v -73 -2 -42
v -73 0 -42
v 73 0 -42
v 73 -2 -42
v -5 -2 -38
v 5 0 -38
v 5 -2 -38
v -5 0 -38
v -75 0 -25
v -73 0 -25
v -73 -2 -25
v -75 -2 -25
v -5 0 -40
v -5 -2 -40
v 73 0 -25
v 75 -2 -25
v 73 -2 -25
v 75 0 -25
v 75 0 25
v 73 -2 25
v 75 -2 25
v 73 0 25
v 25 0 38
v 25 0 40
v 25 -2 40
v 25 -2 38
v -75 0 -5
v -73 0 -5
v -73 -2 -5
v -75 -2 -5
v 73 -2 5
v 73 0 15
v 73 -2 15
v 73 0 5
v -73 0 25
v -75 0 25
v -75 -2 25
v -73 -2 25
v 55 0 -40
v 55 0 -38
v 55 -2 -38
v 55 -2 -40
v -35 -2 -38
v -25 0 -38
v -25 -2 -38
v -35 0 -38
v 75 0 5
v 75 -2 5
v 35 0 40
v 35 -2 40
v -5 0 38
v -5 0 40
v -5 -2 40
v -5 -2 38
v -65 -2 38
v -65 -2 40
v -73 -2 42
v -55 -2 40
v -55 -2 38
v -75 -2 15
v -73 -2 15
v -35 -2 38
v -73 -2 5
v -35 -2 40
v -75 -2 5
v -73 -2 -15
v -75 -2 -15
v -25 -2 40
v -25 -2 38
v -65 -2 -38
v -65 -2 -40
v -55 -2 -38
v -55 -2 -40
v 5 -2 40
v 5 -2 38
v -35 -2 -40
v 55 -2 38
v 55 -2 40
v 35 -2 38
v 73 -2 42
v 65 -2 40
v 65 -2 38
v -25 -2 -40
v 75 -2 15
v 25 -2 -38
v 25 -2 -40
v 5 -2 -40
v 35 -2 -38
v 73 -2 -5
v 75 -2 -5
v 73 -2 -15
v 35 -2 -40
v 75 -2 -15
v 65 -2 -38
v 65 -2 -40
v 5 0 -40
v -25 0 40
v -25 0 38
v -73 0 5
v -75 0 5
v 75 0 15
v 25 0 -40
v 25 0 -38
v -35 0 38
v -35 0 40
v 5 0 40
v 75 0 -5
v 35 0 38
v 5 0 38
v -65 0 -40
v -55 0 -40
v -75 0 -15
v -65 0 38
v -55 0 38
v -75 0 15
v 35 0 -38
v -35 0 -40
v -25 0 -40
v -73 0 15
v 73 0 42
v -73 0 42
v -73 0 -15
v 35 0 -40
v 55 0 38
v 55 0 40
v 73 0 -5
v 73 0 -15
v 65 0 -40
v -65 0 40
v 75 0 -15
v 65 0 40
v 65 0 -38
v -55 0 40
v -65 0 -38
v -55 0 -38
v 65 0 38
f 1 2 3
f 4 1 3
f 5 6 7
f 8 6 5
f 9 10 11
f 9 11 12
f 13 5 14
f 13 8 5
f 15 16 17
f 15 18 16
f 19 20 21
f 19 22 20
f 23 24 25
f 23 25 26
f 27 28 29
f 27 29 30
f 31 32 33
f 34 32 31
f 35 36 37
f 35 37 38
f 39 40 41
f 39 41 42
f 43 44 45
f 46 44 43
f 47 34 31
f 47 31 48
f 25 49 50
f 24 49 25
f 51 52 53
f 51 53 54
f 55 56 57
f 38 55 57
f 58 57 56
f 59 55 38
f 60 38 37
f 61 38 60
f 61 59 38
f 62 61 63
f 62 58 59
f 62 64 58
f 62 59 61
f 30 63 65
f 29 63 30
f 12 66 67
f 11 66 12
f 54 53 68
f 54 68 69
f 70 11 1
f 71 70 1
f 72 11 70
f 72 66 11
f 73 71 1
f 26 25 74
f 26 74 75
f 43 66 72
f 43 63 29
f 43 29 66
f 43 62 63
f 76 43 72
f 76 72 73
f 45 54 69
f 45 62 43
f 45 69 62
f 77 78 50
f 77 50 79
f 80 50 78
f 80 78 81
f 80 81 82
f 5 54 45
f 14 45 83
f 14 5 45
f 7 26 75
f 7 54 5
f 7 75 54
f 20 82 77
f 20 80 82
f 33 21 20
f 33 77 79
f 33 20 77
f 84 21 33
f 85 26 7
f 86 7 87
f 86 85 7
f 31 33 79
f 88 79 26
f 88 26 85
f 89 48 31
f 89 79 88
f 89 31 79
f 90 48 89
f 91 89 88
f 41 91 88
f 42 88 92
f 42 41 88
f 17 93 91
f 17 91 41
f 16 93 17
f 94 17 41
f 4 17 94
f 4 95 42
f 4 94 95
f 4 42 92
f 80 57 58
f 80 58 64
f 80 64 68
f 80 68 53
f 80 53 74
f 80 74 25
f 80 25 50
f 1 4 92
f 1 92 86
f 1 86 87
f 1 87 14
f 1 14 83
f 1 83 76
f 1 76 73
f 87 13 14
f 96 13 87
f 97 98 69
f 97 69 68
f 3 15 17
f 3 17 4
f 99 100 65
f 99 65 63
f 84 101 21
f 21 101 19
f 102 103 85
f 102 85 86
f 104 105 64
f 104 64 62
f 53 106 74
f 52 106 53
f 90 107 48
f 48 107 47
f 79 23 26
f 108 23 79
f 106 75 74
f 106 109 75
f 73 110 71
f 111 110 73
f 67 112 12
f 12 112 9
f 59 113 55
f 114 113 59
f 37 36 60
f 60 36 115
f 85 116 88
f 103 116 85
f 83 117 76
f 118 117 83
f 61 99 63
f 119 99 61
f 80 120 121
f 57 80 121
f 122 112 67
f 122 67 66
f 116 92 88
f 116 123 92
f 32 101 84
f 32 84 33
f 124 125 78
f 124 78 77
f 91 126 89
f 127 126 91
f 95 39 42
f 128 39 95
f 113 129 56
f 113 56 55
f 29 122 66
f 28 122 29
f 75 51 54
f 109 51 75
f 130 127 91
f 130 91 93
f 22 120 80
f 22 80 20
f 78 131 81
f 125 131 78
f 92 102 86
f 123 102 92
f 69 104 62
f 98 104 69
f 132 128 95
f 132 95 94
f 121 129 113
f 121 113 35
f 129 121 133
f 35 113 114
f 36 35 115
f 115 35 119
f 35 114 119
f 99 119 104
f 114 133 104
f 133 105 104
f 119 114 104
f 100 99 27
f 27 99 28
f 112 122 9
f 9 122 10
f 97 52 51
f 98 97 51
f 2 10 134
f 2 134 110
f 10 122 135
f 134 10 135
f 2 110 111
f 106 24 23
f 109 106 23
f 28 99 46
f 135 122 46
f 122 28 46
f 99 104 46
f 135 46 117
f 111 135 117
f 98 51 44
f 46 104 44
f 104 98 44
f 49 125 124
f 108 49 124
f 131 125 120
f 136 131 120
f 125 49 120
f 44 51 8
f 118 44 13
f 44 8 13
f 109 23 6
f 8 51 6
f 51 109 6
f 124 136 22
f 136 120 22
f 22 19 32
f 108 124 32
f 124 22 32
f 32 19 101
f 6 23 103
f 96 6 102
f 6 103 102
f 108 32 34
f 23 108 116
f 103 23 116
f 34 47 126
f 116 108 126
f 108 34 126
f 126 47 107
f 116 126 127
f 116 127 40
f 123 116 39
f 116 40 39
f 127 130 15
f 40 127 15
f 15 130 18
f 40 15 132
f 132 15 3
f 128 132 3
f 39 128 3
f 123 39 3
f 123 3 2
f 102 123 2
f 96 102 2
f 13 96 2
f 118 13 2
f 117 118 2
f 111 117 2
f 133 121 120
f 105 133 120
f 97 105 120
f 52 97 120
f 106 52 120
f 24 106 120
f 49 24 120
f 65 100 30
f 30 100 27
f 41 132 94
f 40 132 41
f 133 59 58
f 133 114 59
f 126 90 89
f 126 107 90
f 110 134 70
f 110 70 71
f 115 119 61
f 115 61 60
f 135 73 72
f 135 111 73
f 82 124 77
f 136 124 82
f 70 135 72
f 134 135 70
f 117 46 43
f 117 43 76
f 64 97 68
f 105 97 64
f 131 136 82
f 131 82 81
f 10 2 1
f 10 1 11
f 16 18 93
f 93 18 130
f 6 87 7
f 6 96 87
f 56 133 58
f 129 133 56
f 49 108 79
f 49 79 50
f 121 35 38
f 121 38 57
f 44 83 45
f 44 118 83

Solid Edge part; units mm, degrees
sketch "Sketch1" plane through (0, 0, 0) normal (0, -1, 0) x (1, 0, 0)
  line L0 (75, -42) -> (75, 42)
  line L1 (75, 42) -> (-75, 42)
  line L2 (-75, 42) -> (-75, -42)
  line L3 (-75, -42) -> (75, -42)
extrude "Protrusion1" add sketch "Sketch1" along normal blind 2
sketch "Sketch2" plane through (0, 0, 0) normal (0, -1, 0) x (1, 0, 0)
  line L0 (-55, 38) -> (-55, 40)
  line L1 (-55, 40) -> (-65, 40)
  line L2 (-65, 40) -> (-65, 38)
  line L3 (-65, 38) -> (-55, 38)
  line L4 (-25, 40) -> (-35, 40)
  line L5 (-35, 40) -> (-35, 38)
  line L6 (-35, 38) -> (-25, 38)
  line L7 (-25, 38) -> (-25, 40)
  line L8 (-5, 38) -> (5, 38)
  line L9 (5, 38) -> (5, 40)
  line L10 (5, 40) -> (-5, 40)
  line L11 (-5, 40) -> (-5, 38)
  line L12 (25, 38) -> (35, 38)
  line L13 (35, 38) -> (35, 40)
  line L14 (35, 40) -> (25, 40)
  line L15 (25, 40) -> (25, 38)
  line L16 (55, 38) -> (65, 38)
  line L17 (65, 38) -> (65, 40)
  line L18 (65, 40) -> (55, 40)
  line L19 (55, 40) -> (55, 38)
  line L20 (65, -40) -> (65, -38)
  line L21 (65, -38) -> (55, -38)
  line L22 (55, -38) -> (55, -40)
  line L23 (55, -40) -> (65, -40)
  line L24 (25, -40) -> (35, -40)
  line L25 (35, -40) -> (35, -38)
  line L26 (35, -38) -> (25, -38)
  line L27 (25, -38) -> (25, -40)
  line L28 (5, -38) -> (-5, -38)
  line L29 (-5, -38) -> (-5, -40)
  line L30 (-5, -40) -> (5, -40)
  line L31 (5, -40) -> (5, -38)
  line L32 (-25, -38) -> (-35, -38)
  line L33 (-35, -38) -> (-35, -40)
  line L34 (-35, -40) -> (-25, -40)
  line L35 (-25, -40) -> (-25, -38)
  line L36 (-55, -40) -> (-55, -38)
  line L37 (-55, -38) -> (-65, -38)
  line L38 (-65, -38) -> (-65, -40)
  line L39 (-65, -40) -> (-55, -40)
  line L40 (-73, -42) -> (-73, -25)
  line L41 (-73, -25) -> (-75, -25)
  line L42 (-75, -25) -> (-75, -42)
  line L43 (-75, -42) -> (-73, -42)
  line L44 (-73, -15) -> (-73, -5)
  line L45 (-73, -5) -> (-75, -5)
  line L46 (-75, -5) -> (-75, -15)
  line L47 (-75, -15) -> (-73, -15)
  line L48 (-73, 5) -> (-73, 15)
  line L49 (-73, 15) -> (-75, 15)
  line L50 (-75, 15) -> (-75, 5)
  line L51 (-75, 5) -> (-73, 5)
  line L52 (-73, 25) -> (-73, 42)
  line L53 (-73, 42) -> (-75, 42)
  line L54 (-75, 42) -> (-75, 25)
  line L55 (-75, 25) -> (-73, 25)
  line L56 (75, 25) -> (75, 42)
  line L57 (75, 42) -> (73, 42)
  line L58 (73, 42) -> (73, 25)
  line L59 (73, 25) -> (75, 25)
  line L60 (73, 15) -> (73, 5)
  line L61 (73, 5) -> (75, 5)
  line L62 (75, 5) -> (75, 15)
  line L63 (75, 15) -> (73, 15)
  line L64 (73, -5) -> (73, -15)
  line L65 (73, -15) -> (75, -15)
  line L66 (75, -15) -> (75, -5)
  line L67 (75, -5) -> (73, -5)
  line L68 (73, -25) -> (73, -42)
  line L69 (73, -42) -> (75, -42)
  line L70 (75, -42) -> (75, -25)
  line L71 (75, -25) -> (73, -25)
  dimension "D1" = 10
  dimension "D2" = 2
  dimension "D3" = 10
  dimension "D4" = 2
  dimension "D5" = 10
  dimension "D6" = 2
  dimension "D7" = 10
  dimension "D8" = 2
  dimension "D9" = 10
  dimension "D10" = 2
  dimension "D11" = 10
  dimension "D12" = 2
  dimension "D13" = 20
  dimension "D14" = 2
  dimension "D15" = 20
  dimension "D16" = 2
  dimension "D17" = 20
  dimension "D18" = 2
  dimension "D19" = 20
  dimension "D20" = 2
  dimension "D21" = 2
  dimension "D22" = 17
  dimension "D23" = 2
  dimension "D24" = 10
  dimension "D25" = 2
  dimension "D26" = 10
  dimension "D27" = 2
  dimension "D28" = 17
  dimension "D29" = 10
  dimension "D30" = 2
  dimension "D31" = 10
  dimension "D32" = 2
  dimension "D33" = 10
  dimension "D34" = 2
  dimension "D35" = 10
  dimension "D36" = 2
  dimension "D37" = 10
  dimension "D38" = 2
  dimension "D39" = 10
  dimension "D40" = 10
  dimension "D41" = 10
  dimension "D42" = 2
  dimension "D43" = 10
  dimension "D44" = 2
  dimension "D45" = 2
  dimension "D46" = 2
  dimension "D47" = 2
  dimension "D48" = 20
  dimension "D49" = 20
  dimension "D50" = 20
  dimension "D51" = 20
  dimension "D52" = 2
  dimension "D53" = 17
  dimension "D54" = 2
  dimension "D55" = 10
  dimension "D56" = 2
  dimension "D57" = 17
  dimension "D58" = 2
  dimension "D59" = 10
  dimension "D60" = 10
  dimension "D61" = 10
extrude "ExtrudedCutout_1" cut sketch "Sketch2" along normal blind 2
properties material "Acrylic, high impact grade"
